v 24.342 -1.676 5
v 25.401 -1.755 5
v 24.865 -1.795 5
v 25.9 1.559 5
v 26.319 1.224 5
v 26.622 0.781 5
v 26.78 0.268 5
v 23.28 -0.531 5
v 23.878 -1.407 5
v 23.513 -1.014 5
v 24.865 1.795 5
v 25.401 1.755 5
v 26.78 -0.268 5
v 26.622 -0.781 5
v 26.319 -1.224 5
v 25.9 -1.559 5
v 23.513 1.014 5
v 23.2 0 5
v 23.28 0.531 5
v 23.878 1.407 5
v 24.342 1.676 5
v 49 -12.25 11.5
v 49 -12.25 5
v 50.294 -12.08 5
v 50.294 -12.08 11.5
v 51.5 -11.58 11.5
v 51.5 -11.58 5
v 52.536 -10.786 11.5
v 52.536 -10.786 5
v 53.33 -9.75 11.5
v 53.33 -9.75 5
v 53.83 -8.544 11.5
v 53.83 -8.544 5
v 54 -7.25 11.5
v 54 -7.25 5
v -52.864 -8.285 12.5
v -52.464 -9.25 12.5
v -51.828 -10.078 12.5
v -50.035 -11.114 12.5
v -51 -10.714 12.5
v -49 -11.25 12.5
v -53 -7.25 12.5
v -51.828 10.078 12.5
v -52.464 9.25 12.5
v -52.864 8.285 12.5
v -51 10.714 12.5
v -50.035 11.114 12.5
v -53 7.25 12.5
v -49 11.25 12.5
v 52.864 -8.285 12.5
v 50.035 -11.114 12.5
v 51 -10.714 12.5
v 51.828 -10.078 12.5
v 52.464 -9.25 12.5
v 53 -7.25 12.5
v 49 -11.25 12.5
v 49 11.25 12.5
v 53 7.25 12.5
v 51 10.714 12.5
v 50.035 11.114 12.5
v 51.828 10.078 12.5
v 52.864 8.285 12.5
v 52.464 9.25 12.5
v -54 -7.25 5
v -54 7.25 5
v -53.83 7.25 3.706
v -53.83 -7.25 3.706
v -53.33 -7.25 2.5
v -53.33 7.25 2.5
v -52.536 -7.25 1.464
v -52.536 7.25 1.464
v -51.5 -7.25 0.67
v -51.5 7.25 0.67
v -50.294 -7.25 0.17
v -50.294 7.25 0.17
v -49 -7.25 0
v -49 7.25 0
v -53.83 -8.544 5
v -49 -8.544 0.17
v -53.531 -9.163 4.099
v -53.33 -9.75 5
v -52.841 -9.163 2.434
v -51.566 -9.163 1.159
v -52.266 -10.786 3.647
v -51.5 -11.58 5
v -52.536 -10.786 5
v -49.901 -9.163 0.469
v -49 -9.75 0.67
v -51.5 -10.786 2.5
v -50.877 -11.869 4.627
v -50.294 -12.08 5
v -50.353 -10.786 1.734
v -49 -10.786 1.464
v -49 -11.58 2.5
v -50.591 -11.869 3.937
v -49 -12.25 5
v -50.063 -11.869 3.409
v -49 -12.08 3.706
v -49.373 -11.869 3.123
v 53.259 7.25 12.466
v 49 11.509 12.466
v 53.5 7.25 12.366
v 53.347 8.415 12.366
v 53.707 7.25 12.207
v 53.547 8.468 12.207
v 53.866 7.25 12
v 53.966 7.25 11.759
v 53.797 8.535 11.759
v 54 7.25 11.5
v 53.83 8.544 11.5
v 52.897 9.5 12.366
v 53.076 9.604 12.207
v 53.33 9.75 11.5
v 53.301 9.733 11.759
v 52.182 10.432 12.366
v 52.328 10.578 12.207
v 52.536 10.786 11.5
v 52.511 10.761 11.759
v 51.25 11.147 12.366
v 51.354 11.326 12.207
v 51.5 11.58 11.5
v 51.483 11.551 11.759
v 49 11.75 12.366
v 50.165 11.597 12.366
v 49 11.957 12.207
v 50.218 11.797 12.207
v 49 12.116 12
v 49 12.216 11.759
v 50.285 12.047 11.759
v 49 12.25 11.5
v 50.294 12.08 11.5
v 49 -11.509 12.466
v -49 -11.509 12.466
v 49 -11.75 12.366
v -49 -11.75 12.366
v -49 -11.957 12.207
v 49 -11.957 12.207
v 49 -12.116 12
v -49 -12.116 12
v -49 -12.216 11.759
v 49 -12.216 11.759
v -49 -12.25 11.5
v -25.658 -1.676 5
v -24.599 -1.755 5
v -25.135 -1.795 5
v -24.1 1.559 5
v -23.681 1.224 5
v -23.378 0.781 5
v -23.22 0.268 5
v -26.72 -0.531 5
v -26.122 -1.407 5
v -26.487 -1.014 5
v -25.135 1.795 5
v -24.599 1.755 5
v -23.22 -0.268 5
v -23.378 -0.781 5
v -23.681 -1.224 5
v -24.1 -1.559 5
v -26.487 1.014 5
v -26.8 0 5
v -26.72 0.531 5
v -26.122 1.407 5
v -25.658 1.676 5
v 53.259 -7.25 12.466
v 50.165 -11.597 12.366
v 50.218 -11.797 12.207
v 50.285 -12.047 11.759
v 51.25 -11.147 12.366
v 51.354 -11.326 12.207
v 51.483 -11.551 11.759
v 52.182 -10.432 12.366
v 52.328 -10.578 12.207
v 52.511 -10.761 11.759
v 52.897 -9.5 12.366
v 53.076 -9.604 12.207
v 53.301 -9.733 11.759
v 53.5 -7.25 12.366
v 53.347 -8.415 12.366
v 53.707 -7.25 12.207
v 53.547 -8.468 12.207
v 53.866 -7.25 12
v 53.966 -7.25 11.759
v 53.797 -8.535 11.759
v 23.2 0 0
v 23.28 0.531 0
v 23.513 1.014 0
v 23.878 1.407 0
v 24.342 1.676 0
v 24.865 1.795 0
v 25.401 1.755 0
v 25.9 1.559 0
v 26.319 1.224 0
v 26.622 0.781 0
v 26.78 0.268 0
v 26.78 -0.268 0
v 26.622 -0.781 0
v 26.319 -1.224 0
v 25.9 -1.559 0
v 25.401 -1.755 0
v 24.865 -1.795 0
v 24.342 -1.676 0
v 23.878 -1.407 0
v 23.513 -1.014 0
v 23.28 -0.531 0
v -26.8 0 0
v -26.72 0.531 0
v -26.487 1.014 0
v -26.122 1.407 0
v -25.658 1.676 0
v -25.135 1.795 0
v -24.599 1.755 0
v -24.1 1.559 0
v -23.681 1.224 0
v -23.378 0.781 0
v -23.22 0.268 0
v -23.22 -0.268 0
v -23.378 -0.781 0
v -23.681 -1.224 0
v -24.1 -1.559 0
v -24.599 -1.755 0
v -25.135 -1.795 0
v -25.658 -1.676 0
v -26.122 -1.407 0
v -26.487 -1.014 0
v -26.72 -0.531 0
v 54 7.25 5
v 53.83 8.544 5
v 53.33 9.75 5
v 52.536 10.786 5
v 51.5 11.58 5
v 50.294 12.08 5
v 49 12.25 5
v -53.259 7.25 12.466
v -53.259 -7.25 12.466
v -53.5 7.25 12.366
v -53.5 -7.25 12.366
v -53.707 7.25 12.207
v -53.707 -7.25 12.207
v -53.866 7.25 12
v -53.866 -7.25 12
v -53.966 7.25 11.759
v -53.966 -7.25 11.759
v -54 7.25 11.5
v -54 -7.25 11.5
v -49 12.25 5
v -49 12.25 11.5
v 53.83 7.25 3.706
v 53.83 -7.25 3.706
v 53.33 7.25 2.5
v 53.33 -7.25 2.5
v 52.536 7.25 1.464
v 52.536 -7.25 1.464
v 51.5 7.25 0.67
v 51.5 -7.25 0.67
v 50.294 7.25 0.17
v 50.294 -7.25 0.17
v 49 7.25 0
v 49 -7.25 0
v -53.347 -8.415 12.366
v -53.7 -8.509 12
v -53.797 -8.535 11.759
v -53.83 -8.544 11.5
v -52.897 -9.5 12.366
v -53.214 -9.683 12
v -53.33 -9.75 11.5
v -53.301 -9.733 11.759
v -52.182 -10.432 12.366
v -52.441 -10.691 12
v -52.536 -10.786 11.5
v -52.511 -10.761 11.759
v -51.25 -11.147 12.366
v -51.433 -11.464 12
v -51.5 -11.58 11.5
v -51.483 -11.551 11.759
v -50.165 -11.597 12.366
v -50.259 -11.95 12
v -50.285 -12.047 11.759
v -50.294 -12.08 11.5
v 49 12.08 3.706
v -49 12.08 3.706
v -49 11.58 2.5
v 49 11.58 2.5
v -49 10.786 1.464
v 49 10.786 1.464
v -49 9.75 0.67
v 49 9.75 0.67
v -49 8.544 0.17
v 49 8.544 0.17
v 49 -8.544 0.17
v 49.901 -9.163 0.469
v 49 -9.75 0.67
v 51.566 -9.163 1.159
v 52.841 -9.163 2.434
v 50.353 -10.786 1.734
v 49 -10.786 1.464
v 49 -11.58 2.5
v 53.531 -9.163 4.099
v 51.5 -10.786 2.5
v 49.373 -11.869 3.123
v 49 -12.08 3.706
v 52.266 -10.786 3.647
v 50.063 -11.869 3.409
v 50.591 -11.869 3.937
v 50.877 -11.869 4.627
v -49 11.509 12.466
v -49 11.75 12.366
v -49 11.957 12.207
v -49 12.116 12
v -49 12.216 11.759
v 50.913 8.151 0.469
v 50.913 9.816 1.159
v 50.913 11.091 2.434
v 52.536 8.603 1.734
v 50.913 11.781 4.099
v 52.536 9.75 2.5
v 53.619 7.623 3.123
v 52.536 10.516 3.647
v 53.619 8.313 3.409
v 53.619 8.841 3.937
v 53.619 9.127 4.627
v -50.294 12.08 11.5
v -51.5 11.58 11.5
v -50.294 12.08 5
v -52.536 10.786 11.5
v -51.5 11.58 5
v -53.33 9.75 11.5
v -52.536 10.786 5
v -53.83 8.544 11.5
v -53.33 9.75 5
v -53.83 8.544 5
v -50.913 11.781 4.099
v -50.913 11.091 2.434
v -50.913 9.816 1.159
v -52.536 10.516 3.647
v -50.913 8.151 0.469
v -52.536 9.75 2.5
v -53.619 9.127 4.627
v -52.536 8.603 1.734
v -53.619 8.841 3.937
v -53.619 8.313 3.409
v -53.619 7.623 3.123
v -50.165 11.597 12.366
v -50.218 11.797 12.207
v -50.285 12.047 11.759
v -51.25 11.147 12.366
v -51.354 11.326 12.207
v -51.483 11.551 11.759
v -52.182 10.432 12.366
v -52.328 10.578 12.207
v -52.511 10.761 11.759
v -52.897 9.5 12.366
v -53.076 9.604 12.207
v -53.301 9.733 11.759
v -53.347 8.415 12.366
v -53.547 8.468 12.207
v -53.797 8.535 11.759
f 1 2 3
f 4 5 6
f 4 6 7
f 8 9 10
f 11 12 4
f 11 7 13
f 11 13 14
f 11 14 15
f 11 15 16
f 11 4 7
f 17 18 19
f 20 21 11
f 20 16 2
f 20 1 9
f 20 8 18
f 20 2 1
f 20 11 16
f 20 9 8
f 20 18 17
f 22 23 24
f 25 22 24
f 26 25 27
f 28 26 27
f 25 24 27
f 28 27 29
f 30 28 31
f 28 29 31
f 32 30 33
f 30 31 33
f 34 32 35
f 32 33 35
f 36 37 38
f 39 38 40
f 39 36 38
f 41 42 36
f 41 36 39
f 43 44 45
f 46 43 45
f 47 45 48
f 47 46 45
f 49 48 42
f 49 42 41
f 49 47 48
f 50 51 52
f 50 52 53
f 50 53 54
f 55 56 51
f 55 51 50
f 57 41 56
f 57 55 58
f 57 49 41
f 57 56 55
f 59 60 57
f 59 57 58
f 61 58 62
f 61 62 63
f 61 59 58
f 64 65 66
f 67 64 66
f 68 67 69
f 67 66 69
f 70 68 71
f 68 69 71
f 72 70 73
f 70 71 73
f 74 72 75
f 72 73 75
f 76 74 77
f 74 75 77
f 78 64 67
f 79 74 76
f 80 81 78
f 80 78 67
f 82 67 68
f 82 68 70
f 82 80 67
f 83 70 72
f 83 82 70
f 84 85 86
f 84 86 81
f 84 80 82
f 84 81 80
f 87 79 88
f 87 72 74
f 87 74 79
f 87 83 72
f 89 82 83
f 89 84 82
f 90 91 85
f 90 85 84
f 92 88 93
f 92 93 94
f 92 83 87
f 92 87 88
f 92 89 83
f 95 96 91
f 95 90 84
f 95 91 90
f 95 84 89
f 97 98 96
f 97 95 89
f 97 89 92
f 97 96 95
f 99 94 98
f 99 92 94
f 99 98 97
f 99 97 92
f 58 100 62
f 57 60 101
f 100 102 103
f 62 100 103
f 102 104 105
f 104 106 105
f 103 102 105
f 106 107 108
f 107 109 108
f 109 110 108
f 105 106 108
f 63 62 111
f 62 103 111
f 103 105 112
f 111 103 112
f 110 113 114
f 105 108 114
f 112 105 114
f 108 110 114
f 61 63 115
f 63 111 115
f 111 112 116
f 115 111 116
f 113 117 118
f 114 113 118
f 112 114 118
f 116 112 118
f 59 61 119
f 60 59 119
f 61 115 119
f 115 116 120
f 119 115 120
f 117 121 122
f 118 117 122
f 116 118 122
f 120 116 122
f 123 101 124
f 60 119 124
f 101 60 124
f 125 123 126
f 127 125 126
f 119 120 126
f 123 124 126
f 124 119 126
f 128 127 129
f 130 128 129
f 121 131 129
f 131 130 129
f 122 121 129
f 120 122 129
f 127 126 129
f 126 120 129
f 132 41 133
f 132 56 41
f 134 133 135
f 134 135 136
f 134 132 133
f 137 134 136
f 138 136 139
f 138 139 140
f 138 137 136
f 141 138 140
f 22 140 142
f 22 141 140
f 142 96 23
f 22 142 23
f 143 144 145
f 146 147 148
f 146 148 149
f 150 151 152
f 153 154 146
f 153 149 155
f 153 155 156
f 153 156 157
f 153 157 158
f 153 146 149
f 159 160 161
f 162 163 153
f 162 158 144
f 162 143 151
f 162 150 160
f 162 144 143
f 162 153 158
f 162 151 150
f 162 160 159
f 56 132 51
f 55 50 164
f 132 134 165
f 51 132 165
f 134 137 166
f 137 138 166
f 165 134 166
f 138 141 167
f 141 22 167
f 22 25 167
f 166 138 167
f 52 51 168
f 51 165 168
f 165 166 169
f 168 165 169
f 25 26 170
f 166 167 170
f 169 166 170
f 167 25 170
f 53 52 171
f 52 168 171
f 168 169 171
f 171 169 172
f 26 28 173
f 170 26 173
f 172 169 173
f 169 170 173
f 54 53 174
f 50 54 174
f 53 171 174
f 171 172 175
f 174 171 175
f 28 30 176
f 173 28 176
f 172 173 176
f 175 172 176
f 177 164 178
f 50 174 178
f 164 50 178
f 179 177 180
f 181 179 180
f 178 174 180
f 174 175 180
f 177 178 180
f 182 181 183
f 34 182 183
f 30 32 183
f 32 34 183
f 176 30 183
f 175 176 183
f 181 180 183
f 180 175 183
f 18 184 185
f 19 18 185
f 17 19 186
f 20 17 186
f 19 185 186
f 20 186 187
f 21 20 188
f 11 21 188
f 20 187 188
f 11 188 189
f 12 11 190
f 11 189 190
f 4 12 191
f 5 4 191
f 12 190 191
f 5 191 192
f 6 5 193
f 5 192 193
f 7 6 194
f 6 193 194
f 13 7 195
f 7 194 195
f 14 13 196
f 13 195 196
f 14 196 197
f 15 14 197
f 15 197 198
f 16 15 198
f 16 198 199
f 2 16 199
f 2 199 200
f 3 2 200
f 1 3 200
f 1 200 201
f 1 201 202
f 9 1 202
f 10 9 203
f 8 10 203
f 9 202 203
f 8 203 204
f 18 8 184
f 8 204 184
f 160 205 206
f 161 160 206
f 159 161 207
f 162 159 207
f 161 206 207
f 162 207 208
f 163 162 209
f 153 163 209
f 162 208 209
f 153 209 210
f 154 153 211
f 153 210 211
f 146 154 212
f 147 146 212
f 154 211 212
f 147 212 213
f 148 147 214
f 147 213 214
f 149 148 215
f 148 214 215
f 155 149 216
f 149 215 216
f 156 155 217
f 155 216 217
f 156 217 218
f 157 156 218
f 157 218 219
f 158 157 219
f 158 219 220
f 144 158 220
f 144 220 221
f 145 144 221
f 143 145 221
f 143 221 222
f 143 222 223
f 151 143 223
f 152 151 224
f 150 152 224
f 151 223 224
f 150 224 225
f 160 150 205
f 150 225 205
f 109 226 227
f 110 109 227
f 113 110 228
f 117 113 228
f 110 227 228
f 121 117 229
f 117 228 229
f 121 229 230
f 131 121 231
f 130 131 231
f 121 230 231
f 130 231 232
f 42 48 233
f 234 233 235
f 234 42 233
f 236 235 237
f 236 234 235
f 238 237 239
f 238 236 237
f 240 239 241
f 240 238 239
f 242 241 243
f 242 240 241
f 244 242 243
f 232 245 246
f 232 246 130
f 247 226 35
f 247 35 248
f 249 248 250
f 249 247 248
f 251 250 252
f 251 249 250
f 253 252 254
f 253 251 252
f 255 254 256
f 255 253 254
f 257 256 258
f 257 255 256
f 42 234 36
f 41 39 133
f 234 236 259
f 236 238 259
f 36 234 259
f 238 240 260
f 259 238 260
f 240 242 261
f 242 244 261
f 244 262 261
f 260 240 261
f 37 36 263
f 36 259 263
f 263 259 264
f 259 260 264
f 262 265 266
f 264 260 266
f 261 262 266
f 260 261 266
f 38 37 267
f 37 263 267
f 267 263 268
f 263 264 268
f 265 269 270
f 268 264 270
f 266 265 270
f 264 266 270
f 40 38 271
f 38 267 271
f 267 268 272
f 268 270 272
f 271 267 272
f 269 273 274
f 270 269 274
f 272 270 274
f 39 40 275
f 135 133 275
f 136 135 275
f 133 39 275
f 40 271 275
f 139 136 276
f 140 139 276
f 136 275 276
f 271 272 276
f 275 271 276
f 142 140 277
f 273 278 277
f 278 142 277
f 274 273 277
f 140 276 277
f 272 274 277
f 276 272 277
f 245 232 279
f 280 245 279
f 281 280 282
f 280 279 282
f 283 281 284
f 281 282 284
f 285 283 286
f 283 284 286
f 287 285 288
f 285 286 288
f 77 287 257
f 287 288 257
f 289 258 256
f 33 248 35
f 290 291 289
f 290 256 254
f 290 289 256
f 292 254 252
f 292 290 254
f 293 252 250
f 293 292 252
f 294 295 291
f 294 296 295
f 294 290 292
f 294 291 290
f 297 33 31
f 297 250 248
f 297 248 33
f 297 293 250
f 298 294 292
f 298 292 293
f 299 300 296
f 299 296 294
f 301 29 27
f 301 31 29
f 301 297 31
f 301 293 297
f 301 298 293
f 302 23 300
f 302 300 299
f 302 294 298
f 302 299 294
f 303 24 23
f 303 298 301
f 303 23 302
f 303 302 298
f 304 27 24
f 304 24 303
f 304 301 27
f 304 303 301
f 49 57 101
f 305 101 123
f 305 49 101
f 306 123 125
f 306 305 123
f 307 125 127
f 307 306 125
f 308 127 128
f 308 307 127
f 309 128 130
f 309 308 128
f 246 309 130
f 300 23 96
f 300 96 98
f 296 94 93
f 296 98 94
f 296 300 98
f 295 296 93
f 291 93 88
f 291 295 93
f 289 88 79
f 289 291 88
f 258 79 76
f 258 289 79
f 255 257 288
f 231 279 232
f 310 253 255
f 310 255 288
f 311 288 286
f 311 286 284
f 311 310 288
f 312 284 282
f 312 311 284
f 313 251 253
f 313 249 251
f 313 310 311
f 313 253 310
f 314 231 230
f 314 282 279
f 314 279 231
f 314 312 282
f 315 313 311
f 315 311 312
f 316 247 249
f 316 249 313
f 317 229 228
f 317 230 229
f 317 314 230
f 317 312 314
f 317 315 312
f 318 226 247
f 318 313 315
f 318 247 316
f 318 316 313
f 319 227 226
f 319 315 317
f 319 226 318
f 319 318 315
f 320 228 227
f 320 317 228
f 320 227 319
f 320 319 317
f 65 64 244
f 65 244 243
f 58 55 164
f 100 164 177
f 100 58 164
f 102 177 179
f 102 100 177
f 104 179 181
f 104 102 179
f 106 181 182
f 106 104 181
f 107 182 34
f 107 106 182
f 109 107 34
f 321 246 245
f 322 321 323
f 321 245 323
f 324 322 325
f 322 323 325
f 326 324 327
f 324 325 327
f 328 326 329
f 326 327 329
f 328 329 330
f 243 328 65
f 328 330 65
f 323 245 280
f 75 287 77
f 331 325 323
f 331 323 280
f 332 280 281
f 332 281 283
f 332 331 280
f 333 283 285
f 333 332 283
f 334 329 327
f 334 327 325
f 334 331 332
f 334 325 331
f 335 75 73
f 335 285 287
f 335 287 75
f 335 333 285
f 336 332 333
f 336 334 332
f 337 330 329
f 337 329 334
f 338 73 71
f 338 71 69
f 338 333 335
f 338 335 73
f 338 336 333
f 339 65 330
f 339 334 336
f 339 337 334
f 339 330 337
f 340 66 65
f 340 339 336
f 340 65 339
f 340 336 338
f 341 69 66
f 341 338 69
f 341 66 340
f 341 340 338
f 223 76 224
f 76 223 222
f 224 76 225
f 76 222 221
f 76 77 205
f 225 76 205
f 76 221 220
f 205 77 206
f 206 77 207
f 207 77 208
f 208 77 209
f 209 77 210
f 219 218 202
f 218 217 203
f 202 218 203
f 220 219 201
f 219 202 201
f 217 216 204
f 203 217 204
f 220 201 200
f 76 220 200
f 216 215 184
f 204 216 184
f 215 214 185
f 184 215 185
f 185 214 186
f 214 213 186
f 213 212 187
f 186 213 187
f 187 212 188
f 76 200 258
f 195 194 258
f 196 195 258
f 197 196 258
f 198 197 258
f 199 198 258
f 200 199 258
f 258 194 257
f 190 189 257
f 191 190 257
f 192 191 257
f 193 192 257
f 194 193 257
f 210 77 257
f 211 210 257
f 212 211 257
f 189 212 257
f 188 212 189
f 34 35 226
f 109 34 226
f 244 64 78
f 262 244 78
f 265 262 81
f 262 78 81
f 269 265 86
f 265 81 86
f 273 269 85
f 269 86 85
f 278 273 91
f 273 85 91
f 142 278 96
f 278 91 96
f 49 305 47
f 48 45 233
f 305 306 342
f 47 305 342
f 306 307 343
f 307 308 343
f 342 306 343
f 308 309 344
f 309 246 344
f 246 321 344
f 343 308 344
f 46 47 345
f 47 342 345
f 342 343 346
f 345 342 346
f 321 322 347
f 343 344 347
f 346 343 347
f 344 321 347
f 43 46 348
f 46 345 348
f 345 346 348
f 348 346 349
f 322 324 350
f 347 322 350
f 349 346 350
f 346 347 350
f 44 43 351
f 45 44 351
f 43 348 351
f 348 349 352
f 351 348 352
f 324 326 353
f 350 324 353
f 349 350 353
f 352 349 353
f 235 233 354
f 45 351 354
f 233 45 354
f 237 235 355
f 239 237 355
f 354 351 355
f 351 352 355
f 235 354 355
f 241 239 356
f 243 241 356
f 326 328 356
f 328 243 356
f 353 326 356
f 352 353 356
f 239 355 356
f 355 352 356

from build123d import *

# Parameters (mm, degrees)
SKETCH1_W           = 108
SKETCH1_H           = 24.5
BOSS_EXTRUDE1_DEPTH = 12.5
FILLET1_R           = 5
SKETCH2_R           = 1.8
CUT_EXTRUDE1_DEPTH  = 5
FILLET2_R           = 5
FILLET3_R           = 1


with BuildPart() as part:
    # Sketch1 → Boss-Extrude1 (new body)
    with BuildSketch(Plane.XY):
        Rectangle(SKETCH1_W, SKETCH1_H)
    extrude(amount=BOSS_EXTRUDE1_DEPTH)

    # Fillet1
    fillet1_edges = [part.edges().sort_by_distance(p)[0] for p in [
        (0, -12.25, 0),
        (-54, 0, 0),
        (0, 12.25, 0),
        (54, 0, 0),
    ]]
    fillet(fillet1_edges, radius=FILLET1_R)

    # Sketch2 → Cut-Extrude1 (cut)
    with BuildSketch(Plane(origin=(0, 0, 0), x_dir=(-1, 0, 0), z_dir=(0, 0, -1))):
        with Locations((-25, 0)):
            Circle(SKETCH2_R)
        with Locations((25, 0)):
            Circle(SKETCH2_R)
    extrude(amount=-CUT_EXTRUDE1_DEPTH, mode=Mode.SUBTRACT)

    # Fillet2
    # the kernel refuses this fillet: 5 mm, written as the material it takes off along each edge
    with BuildSketch(Plane(origin=(49, 7.25, 5), x_dir=(0, 1, 0), z_dir=(1, 0, 0))) as fillet2_piece_1_section:
        Polygon((0, 0), (FILLET2_R, 0), (FILLET2_R, -FILLET2_R), (0, -FILLET2_R), align=None)
    fillet2_piece_1 = extrude(amount=FILLET2_R, mode=Mode.PRIVATE)
    fillet2_piece_1 = fillet2_piece_1 - Plane(origin=(49, 7.25, 5), x_dir=(0, -0.7071067811865475, 0.7071067811865475), z_dir=(1, 0, 0)) * Sphere(FILLET2_R, mode=Mode.PRIVATE)
    add(fillet2_piece_1, mode=Mode.SUBTRACT)
    with BuildSketch(Plane(origin=(49, -7.25, 5), x_dir=(1, 0, 0), z_dir=(0, -1, 0))) as fillet2_piece_2_section:
        Polygon((0, 0), (FILLET2_R, 0), (FILLET2_R, -FILLET2_R), (0, -FILLET2_R), align=None)
    fillet2_piece_2 = extrude(amount=FILLET2_R, mode=Mode.PRIVATE)
    fillet2_piece_2 = fillet2_piece_2 - Plane(origin=(49, -7.25, 5), x_dir=(-0.7071067811865475, 0, 0.7071067811865475), z_dir=(0, -1, 0)) * Sphere(FILLET2_R, mode=Mode.PRIVATE)
    add(fillet2_piece_2, mode=Mode.SUBTRACT)
    with BuildSketch(Plane(origin=(-49, 7.25, 5), x_dir=(0, 1, 0), z_dir=(-1, 0, 0))) as fillet2_piece_3_section:
        Polygon((0, 0), (FILLET2_R, 0), (FILLET2_R, FILLET2_R), (0, FILLET2_R), align=None)
    fillet2_piece_3 = extrude(amount=FILLET2_R, mode=Mode.PRIVATE)
    fillet2_piece_3 = fillet2_piece_3 - Plane(origin=(-49, 7.25, 5), x_dir=(0, -0.7071067811865475, 0.7071067811865475), z_dir=(-1, 0, 0)) * Sphere(FILLET2_R, mode=Mode.PRIVATE)
    add(fillet2_piece_3, mode=Mode.SUBTRACT)
    with BuildSketch(Plane(origin=(-49, -7.25, 5), x_dir=(-1, 0, 0), z_dir=(0, -1, 0))) as fillet2_piece_4_section:
        Polygon((0, 0), (FILLET2_R, 0), (FILLET2_R, FILLET2_R), (0, FILLET2_R), align=None)
    fillet2_piece_4 = extrude(amount=FILLET2_R, mode=Mode.PRIVATE)
    fillet2_piece_4 = fillet2_piece_4 - Plane(origin=(-49, -7.25, 5), x_dir=(0.7071067811865475, 0, 0.7071067811865475), z_dir=(0, -1, 0)) * Sphere(FILLET2_R, mode=Mode.PRIVATE)
    add(fillet2_piece_4, mode=Mode.SUBTRACT)
    with BuildSketch(Plane(origin=(54, -12.25, 5), x_dir=(-1, 0, 0), z_dir=(0, 0, 1)), Plane(origin=(54, 12.25, 5), x_dir=(0, -1, 0), z_dir=(0, 0, 1))) as fillet2_piece_5:
        with BuildLine():
            CenterArc((FILLET2_R, -FILLET2_R), FILLET2_R, 90, 90)
            Line((0, -FILLET2_R), (0, 0))
            Line((0, 0), (FILLET2_R, 0))
        make_face()
    extrude(amount=20, mode=Mode.SUBTRACT)
    with BuildSketch(Plane(origin=(-54, -12.25, 5), x_dir=(1, 0, 0), z_dir=(0, 0, 1)), Plane(origin=(-54, 12.25, 5), x_dir=(0, -1, 0), z_dir=(0, 0, 1))) as fillet2_piece_6:
        with BuildLine():
            CenterArc((FILLET2_R, FILLET2_R), FILLET2_R, 180, 90)
            Line((0, FILLET2_R), (0, 0))
            Line((0, 0), (FILLET2_R, 0))
        make_face()
    extrude(amount=20, mode=Mode.SUBTRACT)

    # Fillet3
    fillet3_edges = [part.edges().sort_by_distance(p)[0] for p in [
        (0, -12.25, 12.5),
        (-54, 0, 12.5),
        (54, 0, 12.5),
        (0, 12.25, 12.5),
        (52.535533906, 10.785533906, 12.5),
        (52.535533906, -10.785533906, 12.5),
        (-52.535533906, 10.785533906, 12.5),
        (-52.535533906, -10.785533906, 12.5),
    ]]
    fillet(fillet3_edges, radius=FILLET3_R)


solid = part.part
